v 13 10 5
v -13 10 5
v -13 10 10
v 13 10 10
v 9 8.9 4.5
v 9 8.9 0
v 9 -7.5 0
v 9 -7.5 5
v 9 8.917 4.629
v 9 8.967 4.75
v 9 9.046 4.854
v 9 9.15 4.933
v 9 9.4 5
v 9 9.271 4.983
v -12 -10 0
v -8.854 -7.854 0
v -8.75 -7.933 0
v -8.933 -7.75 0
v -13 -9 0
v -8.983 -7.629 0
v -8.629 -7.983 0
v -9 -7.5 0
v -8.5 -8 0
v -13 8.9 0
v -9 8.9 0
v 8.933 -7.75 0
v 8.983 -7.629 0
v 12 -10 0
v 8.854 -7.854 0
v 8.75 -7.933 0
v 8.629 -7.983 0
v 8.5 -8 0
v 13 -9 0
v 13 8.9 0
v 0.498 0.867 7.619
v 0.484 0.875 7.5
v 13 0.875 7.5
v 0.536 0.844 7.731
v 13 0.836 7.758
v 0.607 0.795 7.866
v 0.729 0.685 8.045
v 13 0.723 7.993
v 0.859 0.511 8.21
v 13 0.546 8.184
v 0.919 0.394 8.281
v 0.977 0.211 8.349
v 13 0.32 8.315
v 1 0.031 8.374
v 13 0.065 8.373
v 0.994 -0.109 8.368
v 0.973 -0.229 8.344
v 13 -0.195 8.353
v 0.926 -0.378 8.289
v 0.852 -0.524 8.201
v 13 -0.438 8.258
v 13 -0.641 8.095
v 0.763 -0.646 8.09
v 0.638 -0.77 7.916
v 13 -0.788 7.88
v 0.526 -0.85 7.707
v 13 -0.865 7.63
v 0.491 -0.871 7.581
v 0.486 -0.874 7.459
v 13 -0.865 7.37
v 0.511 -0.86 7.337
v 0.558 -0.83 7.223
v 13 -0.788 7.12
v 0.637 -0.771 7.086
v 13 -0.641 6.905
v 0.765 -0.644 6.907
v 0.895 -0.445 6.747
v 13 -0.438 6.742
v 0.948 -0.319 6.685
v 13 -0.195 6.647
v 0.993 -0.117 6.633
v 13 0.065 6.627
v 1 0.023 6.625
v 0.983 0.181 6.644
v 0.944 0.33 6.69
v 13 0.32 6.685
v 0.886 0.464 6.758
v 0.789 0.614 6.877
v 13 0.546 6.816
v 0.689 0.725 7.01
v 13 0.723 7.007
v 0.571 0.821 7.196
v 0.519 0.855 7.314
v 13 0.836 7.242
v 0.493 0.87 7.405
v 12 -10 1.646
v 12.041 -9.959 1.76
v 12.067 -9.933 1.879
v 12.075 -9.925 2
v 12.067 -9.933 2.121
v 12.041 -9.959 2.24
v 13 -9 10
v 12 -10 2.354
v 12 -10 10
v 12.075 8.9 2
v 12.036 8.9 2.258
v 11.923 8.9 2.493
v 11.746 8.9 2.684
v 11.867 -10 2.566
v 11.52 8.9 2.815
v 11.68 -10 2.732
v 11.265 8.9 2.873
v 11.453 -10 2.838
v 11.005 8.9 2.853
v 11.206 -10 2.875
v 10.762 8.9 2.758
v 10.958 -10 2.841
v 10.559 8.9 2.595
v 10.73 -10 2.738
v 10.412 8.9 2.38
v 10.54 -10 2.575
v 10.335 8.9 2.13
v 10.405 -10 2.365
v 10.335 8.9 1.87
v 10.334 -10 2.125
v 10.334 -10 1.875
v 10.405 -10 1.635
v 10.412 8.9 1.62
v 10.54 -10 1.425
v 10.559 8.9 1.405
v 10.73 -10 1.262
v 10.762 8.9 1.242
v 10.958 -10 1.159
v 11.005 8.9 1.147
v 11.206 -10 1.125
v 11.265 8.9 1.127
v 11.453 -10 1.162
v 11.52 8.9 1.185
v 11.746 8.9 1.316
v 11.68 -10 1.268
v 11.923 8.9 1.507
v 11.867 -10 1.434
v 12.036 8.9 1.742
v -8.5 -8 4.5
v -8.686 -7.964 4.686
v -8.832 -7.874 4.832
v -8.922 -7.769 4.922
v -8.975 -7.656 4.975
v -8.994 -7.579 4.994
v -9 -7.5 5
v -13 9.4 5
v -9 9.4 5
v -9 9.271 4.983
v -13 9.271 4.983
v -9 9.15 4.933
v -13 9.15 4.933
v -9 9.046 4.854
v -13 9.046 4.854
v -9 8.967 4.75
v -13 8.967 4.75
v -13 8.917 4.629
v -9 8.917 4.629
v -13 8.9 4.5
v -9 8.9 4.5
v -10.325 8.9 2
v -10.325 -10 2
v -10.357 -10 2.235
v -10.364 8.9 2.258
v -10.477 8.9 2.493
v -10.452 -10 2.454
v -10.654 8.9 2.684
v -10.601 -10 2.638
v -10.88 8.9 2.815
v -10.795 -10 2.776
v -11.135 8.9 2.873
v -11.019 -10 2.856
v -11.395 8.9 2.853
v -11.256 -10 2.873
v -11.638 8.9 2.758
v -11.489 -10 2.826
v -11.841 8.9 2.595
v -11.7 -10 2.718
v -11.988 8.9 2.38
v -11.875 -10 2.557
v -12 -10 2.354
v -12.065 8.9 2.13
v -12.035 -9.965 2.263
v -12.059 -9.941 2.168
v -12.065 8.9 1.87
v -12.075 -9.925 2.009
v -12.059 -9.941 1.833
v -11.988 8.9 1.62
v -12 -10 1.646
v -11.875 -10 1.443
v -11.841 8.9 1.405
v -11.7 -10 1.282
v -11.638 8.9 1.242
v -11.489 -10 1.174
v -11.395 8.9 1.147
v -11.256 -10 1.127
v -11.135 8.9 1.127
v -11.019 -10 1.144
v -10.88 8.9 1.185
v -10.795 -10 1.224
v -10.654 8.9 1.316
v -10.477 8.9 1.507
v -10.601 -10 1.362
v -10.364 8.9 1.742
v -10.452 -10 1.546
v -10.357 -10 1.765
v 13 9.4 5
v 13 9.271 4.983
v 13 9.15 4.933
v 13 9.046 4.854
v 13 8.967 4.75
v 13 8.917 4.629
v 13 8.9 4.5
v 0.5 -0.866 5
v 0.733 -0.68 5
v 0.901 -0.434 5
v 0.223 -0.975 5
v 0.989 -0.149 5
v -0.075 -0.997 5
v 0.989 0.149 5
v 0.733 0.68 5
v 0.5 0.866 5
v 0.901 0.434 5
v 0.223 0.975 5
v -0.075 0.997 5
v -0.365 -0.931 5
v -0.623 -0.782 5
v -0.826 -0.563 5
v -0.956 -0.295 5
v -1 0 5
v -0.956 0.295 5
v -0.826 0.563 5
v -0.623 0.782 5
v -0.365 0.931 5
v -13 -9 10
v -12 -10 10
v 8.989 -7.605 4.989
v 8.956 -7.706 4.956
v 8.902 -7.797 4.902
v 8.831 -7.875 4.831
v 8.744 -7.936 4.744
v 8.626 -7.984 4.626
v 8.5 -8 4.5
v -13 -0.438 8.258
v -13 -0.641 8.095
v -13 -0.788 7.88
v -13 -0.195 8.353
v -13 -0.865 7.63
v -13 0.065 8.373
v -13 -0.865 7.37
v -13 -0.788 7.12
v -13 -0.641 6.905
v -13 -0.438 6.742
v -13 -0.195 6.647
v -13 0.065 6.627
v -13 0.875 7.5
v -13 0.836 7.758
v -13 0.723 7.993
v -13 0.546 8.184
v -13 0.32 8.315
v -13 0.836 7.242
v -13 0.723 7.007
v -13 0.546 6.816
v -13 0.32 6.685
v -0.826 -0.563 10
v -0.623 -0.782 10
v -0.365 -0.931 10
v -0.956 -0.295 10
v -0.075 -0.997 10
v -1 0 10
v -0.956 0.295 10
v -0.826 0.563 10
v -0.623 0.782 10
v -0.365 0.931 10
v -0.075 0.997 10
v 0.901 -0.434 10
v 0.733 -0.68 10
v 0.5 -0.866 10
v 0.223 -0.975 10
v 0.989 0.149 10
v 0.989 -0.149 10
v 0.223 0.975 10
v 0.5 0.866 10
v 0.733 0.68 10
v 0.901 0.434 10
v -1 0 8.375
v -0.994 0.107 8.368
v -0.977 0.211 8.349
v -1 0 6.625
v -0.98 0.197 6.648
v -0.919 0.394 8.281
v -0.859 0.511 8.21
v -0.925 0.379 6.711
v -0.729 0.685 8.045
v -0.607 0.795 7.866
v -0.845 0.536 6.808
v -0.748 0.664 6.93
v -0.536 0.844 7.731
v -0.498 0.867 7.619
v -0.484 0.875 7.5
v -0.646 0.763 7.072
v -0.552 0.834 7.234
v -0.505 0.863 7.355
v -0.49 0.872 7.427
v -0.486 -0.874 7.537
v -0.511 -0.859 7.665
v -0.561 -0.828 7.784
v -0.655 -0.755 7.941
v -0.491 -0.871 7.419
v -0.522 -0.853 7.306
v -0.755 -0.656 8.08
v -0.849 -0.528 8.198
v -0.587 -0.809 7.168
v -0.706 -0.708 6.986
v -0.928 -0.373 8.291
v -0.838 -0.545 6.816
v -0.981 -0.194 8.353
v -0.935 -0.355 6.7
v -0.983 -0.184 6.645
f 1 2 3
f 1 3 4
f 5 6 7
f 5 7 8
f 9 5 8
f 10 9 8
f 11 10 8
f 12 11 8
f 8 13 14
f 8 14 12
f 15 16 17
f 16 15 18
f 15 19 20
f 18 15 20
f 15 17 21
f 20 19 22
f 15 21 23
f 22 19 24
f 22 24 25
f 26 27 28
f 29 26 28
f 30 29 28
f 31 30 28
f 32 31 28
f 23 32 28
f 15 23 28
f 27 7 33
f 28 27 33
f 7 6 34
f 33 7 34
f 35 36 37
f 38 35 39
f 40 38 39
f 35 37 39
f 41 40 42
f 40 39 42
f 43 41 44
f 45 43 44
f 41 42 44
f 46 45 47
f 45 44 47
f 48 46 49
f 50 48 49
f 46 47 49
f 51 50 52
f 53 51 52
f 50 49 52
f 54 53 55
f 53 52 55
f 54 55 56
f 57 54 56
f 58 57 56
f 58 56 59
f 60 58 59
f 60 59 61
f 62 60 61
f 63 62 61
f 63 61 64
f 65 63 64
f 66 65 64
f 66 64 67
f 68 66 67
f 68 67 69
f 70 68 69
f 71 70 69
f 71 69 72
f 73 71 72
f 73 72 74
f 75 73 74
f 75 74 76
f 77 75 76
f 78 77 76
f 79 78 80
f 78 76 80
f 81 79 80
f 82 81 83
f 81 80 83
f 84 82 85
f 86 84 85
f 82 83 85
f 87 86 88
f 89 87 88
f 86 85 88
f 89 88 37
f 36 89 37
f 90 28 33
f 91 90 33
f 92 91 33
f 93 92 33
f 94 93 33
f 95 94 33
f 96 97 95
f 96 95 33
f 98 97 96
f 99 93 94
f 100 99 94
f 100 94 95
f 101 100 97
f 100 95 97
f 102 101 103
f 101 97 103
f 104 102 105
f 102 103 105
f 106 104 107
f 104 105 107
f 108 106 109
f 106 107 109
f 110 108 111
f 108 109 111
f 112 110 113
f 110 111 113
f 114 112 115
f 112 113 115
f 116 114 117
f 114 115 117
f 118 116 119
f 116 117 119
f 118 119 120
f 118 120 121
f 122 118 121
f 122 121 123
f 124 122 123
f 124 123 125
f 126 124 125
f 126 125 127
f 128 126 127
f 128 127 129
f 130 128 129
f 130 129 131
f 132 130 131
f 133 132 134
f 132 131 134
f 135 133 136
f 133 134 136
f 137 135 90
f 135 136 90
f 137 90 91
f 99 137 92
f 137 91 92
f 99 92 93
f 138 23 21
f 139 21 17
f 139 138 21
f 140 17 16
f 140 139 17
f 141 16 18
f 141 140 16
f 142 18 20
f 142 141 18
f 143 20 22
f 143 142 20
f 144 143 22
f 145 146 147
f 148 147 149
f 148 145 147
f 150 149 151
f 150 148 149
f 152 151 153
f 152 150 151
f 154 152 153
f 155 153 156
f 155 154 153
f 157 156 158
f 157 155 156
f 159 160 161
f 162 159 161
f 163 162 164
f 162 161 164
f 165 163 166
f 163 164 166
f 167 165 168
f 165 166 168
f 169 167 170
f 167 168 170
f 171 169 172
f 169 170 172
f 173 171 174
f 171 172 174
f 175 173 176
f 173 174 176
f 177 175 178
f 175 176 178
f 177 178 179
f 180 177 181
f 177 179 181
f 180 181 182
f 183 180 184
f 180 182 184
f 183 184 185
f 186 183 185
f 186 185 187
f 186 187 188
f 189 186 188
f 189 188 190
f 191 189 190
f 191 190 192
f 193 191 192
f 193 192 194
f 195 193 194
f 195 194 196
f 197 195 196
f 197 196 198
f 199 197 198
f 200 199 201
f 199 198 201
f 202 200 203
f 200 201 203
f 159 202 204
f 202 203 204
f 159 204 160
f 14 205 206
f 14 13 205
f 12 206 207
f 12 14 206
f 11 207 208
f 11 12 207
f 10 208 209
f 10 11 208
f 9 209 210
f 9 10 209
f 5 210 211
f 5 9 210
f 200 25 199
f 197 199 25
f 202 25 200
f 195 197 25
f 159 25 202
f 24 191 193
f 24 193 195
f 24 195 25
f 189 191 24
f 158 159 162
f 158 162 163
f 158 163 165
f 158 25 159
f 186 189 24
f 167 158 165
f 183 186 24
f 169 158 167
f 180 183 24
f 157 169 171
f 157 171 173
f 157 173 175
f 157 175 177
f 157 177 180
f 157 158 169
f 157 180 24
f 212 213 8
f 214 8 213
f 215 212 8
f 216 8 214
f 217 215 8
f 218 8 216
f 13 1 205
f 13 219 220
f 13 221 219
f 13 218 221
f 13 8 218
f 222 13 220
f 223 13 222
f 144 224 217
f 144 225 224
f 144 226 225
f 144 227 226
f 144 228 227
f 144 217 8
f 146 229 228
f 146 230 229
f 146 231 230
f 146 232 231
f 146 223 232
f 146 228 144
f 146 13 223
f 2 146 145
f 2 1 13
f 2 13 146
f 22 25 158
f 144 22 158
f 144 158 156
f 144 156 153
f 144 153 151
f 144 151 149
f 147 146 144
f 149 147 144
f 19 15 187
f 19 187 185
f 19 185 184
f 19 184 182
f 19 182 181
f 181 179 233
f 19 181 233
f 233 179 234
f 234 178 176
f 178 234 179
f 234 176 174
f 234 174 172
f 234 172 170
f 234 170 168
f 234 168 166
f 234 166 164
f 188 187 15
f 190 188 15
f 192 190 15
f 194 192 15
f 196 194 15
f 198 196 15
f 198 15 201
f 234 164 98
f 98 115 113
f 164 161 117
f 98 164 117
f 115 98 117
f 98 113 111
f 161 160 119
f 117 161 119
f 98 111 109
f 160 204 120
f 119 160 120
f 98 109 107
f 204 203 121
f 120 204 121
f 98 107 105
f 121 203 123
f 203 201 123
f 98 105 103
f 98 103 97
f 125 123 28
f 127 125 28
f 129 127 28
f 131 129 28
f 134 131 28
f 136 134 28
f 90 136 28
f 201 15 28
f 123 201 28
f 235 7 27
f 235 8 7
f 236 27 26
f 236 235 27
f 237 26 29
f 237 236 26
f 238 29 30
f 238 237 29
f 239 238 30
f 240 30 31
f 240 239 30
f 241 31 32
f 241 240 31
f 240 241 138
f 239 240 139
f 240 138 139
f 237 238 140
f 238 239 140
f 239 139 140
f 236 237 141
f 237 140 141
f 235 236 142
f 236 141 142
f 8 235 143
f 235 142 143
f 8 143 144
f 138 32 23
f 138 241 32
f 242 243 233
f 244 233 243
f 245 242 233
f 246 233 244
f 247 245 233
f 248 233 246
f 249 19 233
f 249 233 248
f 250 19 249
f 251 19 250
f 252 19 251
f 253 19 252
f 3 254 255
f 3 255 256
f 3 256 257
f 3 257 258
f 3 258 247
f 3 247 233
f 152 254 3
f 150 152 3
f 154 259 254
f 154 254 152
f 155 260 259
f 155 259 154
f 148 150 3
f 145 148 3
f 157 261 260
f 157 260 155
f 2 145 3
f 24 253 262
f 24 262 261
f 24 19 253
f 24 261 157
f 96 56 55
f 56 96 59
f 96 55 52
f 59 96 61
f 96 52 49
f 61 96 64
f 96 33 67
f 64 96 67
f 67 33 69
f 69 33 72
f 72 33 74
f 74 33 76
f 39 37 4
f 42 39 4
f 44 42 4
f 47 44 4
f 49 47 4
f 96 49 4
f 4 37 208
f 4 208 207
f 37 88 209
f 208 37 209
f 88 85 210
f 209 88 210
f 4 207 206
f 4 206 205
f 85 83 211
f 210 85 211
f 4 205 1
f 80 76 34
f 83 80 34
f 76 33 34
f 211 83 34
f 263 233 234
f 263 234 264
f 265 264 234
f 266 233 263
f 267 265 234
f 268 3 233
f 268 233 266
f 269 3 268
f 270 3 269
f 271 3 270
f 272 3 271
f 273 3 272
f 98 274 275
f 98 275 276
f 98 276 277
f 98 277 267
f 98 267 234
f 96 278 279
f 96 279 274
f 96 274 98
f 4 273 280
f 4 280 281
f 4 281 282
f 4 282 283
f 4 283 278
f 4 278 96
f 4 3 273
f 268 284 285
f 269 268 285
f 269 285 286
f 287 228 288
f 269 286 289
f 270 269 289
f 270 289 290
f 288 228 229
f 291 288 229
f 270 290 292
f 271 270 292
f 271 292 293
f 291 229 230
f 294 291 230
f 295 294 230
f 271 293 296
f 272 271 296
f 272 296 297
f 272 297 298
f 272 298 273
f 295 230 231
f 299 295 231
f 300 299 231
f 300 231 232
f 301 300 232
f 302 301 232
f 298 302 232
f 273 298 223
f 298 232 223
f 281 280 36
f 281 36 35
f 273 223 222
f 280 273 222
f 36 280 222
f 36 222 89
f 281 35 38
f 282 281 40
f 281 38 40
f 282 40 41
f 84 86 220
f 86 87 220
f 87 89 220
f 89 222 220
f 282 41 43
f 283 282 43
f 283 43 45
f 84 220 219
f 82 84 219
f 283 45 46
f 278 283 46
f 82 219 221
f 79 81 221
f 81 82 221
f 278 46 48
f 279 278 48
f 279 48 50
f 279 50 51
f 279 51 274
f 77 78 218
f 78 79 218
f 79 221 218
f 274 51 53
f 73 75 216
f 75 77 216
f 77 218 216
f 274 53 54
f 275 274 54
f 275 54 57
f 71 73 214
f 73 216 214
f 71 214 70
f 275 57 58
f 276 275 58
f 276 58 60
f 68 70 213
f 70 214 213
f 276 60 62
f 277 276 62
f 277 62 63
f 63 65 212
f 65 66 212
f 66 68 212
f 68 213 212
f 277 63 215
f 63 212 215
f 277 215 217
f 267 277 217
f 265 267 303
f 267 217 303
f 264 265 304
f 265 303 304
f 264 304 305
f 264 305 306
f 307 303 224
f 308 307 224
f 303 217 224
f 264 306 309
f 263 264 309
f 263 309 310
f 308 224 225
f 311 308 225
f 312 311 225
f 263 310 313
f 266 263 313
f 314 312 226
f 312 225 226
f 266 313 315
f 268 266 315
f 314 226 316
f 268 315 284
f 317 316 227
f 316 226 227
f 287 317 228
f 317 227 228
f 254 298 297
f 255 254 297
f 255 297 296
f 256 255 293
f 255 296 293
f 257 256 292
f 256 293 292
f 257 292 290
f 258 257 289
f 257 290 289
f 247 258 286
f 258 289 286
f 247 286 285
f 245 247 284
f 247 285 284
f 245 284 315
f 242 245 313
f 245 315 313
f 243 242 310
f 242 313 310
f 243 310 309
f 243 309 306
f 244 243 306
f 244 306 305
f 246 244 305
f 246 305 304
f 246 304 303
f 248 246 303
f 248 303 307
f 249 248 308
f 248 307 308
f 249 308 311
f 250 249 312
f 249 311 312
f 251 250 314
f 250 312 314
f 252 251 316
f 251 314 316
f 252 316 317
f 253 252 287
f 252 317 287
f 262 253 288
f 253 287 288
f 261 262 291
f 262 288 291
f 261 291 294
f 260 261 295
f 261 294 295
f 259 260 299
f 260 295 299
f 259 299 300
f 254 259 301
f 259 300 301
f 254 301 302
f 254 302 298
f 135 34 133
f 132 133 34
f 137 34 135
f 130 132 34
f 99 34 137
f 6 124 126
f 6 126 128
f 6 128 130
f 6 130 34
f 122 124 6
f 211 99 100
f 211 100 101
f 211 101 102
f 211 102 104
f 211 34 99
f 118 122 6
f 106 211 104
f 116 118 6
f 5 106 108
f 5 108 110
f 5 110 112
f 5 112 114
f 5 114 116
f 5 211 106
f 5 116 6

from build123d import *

# Parameters (mm, degrees)
F0_W     = 26
F0_H     = 20
F1_DEPTH = 10
F2_W     = 18
F2_H     = 5
F3_DEPTH = 18
F4_W     = 26
F4_H     = 5
F5_DEPTH = 1.1
F6_R     = 0.5
F7_R     = 0.5
F8_SIZE  = 1
F10_D    = 1.75
F12_D    = 1.75
F14_D    = 2


with BuildPart() as f1:
    # F0 (on Top) → F1 (new body)
    with BuildSketch(Plane.XY):
        Rectangle(F0_W, F0_H)
    extrude(amount=F1_DEPTH)

    # F2 (on face) → F3 (cut)
    with BuildSketch(Plane(origin=(0, 10, 0), x_dir=(-1, 0, 0), z_dir=(0, 1, 0))):
        with Locations((0, 2.5)):
            Rectangle(F2_W, F2_H)
    extrude(amount=-F3_DEPTH, mode=Mode.SUBTRACT)

    # F4 (on face) → F5 (cut)
    with BuildSketch(Plane(origin=(0, 10, 0), x_dir=(-1, 0, 0), z_dir=(0, 1, 0))):
        with Locations((0, 2.5)):
            Rectangle(F4_W, F4_H)
    extrude(amount=-F5_DEPTH, mode=Mode.SUBTRACT)

    # F6
    f6_edges = [f1.edges().sort_by_distance(p)[0] for p in [
        (9, -8, 2.5),
        (-9, -8, 2.5),
        (0, -8, 5),
    ]]
    fillet(f6_edges, radius=F6_R)

    # F7
    f7_edges = [f1.edges().sort_by_distance(p)[0] for p in [
        (-11, 8.9, 5),
        (11, 8.9, 5),
    ]]
    fillet(f7_edges, radius=F7_R)

    # F8
    f8_edges = [f1.edges().sort_by_distance(p)[0] for p in [
        (13, -10, 5),
        (-13, -10, 5),
    ]]
    chamfer(f8_edges, length=F8_SIZE)

    # F10 (through all)
    with Locations(Plane(origin=(0, 8.9, 0), x_dir=(-1, 0, 0), z_dir=(0, 1, 0))):
        with Locations((-11.2, 2), (11.2, 2)):
            Hole(F10_D / 2)

    # F12 (through all)
    with Locations(Plane(origin=(-13, 0, 0), x_dir=(0, -1, 0), z_dir=(-1, 0, 0))):
        with Locations((0, 7.5)):
            Hole(F12_D / 2)

    # F14 (through all)
    with Locations(Plane.XY.offset(10)):
        with Locations((0, 0)):
            Hole(F14_D / 2)


solid = f1.part
